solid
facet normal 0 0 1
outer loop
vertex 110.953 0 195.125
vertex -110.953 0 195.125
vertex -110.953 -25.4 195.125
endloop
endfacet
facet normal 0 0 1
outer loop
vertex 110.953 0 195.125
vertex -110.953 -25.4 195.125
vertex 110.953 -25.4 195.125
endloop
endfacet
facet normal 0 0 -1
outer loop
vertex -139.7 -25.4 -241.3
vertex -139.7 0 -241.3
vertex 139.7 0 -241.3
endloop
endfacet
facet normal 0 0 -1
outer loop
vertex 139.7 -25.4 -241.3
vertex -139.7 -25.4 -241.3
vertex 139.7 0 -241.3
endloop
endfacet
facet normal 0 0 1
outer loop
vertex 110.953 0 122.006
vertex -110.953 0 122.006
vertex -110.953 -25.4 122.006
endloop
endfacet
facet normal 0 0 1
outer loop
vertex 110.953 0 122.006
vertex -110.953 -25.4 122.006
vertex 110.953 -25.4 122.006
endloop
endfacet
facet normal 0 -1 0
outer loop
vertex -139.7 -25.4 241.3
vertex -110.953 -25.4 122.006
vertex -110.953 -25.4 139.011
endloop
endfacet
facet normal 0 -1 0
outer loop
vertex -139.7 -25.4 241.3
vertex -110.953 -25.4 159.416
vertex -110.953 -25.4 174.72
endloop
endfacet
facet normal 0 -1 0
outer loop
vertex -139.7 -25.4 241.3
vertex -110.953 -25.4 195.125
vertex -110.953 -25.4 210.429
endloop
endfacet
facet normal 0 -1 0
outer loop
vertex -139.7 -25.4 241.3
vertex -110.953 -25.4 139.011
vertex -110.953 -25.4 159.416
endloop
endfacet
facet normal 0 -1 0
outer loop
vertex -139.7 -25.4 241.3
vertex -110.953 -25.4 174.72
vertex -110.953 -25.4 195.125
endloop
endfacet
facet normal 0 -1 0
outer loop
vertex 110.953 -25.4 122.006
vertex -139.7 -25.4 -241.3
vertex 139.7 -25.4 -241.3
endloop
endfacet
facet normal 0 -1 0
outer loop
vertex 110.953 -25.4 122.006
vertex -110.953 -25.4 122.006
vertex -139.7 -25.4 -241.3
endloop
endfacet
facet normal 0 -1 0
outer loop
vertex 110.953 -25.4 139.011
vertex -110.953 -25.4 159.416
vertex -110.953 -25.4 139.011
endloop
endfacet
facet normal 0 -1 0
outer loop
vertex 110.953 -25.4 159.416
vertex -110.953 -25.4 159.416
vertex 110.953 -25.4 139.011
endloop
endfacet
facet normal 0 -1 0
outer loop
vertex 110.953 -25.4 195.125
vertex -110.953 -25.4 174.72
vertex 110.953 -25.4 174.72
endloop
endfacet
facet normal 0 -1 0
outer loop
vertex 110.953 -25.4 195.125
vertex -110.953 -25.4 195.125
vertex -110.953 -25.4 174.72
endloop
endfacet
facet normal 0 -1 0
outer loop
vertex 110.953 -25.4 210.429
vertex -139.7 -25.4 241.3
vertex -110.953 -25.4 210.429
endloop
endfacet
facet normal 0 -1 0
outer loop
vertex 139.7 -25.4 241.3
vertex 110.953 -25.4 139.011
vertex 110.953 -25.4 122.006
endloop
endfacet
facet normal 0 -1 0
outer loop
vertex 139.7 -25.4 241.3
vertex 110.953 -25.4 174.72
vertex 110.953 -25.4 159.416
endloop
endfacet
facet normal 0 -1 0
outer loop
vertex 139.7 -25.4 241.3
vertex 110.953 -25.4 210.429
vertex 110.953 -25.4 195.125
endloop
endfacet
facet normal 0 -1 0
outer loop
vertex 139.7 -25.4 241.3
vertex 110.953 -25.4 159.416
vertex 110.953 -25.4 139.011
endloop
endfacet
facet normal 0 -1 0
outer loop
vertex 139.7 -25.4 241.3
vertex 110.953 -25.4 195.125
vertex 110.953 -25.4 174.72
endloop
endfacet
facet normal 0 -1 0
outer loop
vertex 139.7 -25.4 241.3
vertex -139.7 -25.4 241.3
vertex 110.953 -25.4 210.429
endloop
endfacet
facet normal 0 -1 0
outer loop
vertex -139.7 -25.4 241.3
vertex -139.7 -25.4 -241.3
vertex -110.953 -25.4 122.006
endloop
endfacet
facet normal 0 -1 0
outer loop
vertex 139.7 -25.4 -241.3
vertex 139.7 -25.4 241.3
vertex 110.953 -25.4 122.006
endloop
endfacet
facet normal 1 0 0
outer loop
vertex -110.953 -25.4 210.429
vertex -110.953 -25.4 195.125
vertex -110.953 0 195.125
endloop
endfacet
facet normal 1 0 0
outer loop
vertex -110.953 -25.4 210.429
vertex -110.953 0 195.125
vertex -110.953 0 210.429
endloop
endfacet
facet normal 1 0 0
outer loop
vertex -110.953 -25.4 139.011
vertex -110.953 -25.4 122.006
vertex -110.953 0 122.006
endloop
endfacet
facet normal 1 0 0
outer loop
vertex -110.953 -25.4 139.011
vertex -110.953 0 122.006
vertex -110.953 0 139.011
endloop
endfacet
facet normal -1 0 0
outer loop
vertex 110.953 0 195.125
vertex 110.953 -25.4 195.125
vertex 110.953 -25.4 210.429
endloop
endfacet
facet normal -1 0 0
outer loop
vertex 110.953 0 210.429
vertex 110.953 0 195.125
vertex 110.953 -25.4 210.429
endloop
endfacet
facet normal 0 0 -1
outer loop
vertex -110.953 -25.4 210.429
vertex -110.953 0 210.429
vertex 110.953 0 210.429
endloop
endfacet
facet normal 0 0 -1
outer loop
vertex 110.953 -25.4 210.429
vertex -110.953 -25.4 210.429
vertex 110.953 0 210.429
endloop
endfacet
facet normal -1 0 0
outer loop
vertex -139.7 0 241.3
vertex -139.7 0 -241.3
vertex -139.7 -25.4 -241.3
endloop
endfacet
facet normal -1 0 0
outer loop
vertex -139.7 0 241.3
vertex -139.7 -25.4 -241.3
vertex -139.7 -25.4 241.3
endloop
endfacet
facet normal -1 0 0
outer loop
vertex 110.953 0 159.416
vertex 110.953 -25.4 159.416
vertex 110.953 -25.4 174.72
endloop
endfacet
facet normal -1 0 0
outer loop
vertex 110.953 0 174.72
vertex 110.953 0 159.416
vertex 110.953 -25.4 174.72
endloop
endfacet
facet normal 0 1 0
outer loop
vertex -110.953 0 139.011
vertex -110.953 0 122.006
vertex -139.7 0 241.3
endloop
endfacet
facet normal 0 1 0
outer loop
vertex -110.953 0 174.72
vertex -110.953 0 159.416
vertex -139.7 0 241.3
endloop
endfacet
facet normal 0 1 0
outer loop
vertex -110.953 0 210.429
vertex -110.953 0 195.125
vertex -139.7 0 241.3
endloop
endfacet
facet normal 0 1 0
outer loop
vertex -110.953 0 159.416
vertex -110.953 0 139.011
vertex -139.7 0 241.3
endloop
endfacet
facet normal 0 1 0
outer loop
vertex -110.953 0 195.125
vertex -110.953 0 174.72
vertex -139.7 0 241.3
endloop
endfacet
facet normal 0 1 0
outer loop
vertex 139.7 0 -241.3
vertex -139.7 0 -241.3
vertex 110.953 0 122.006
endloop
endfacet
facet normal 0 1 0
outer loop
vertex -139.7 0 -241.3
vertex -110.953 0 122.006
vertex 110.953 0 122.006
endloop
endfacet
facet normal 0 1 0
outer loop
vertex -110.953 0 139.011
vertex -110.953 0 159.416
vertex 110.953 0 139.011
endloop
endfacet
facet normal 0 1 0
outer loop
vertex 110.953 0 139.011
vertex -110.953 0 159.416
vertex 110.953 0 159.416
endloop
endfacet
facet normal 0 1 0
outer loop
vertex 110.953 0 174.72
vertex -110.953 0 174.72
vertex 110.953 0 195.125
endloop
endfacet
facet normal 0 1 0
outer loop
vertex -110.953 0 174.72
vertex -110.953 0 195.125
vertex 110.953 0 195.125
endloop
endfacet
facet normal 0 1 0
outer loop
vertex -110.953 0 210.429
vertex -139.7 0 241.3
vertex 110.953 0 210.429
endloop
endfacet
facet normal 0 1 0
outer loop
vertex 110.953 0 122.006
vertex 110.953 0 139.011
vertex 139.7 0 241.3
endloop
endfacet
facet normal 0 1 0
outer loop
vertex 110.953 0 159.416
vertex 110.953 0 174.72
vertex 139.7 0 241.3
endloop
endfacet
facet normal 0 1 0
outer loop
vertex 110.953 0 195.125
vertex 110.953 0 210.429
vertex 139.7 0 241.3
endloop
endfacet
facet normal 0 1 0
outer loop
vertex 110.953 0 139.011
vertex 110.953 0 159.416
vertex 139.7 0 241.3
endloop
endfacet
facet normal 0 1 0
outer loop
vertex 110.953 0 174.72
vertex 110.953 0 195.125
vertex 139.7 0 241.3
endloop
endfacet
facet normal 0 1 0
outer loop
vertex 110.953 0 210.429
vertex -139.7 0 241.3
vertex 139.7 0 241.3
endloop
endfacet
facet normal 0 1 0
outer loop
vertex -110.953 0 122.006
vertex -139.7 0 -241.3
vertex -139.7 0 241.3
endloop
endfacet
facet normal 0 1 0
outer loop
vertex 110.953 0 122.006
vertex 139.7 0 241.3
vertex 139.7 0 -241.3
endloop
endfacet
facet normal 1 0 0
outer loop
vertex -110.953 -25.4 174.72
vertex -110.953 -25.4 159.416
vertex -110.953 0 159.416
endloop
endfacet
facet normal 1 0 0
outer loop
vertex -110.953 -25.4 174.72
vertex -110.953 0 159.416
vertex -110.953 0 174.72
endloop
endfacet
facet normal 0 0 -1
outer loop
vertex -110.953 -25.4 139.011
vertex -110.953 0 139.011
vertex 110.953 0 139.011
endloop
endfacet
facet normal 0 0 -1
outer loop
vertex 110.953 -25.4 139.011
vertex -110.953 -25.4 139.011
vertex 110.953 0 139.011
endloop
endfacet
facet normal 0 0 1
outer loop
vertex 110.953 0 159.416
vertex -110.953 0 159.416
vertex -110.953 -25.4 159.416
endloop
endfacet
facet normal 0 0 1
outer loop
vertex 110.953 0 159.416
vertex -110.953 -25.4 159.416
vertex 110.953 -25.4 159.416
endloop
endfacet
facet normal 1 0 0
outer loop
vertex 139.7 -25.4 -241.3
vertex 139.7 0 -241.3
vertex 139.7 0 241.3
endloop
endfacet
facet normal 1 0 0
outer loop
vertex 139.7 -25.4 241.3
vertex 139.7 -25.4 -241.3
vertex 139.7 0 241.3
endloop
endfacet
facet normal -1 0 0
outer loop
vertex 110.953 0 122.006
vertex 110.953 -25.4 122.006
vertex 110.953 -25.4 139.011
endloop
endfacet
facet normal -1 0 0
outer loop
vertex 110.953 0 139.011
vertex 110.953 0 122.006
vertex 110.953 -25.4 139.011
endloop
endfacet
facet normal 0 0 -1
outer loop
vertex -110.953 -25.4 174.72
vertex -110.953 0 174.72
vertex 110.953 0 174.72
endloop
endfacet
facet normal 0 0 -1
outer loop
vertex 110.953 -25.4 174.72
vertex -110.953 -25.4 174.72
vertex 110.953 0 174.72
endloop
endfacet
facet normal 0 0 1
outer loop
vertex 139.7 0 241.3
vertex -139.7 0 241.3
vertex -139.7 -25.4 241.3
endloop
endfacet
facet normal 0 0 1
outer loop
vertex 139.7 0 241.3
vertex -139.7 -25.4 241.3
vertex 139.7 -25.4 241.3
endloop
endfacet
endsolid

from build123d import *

# Parameters (mm, degrees)
F1_W     = 279.4
F1_H     = 482.6
F1_W_2   = 221.90693
F1_H_2   = 17.004371
F1_H_3   = 15.303909
F1_H_4   = 15.30391
F2_DEPTH = 25.4


with BuildPart() as f2:
    # F1 (on face) → F2 (new body)
    with BuildSketch(Plane.XZ):
        Rectangle(F1_W, F1_H)
        with Locations((0, 130.508482)):
            Rectangle(F1_W_2, F1_H_2, mode=Mode.SUBTRACT)
        with Locations((0, 167.06787)):
            Rectangle(F1_W_2, F1_H_3, mode=Mode.SUBTRACT)
        with Locations((0, 202.777028)):
            Rectangle(F1_W_2, F1_H_4, mode=Mode.SUBTRACT)
    extrude(amount=F2_DEPTH)


solid = f2.part
